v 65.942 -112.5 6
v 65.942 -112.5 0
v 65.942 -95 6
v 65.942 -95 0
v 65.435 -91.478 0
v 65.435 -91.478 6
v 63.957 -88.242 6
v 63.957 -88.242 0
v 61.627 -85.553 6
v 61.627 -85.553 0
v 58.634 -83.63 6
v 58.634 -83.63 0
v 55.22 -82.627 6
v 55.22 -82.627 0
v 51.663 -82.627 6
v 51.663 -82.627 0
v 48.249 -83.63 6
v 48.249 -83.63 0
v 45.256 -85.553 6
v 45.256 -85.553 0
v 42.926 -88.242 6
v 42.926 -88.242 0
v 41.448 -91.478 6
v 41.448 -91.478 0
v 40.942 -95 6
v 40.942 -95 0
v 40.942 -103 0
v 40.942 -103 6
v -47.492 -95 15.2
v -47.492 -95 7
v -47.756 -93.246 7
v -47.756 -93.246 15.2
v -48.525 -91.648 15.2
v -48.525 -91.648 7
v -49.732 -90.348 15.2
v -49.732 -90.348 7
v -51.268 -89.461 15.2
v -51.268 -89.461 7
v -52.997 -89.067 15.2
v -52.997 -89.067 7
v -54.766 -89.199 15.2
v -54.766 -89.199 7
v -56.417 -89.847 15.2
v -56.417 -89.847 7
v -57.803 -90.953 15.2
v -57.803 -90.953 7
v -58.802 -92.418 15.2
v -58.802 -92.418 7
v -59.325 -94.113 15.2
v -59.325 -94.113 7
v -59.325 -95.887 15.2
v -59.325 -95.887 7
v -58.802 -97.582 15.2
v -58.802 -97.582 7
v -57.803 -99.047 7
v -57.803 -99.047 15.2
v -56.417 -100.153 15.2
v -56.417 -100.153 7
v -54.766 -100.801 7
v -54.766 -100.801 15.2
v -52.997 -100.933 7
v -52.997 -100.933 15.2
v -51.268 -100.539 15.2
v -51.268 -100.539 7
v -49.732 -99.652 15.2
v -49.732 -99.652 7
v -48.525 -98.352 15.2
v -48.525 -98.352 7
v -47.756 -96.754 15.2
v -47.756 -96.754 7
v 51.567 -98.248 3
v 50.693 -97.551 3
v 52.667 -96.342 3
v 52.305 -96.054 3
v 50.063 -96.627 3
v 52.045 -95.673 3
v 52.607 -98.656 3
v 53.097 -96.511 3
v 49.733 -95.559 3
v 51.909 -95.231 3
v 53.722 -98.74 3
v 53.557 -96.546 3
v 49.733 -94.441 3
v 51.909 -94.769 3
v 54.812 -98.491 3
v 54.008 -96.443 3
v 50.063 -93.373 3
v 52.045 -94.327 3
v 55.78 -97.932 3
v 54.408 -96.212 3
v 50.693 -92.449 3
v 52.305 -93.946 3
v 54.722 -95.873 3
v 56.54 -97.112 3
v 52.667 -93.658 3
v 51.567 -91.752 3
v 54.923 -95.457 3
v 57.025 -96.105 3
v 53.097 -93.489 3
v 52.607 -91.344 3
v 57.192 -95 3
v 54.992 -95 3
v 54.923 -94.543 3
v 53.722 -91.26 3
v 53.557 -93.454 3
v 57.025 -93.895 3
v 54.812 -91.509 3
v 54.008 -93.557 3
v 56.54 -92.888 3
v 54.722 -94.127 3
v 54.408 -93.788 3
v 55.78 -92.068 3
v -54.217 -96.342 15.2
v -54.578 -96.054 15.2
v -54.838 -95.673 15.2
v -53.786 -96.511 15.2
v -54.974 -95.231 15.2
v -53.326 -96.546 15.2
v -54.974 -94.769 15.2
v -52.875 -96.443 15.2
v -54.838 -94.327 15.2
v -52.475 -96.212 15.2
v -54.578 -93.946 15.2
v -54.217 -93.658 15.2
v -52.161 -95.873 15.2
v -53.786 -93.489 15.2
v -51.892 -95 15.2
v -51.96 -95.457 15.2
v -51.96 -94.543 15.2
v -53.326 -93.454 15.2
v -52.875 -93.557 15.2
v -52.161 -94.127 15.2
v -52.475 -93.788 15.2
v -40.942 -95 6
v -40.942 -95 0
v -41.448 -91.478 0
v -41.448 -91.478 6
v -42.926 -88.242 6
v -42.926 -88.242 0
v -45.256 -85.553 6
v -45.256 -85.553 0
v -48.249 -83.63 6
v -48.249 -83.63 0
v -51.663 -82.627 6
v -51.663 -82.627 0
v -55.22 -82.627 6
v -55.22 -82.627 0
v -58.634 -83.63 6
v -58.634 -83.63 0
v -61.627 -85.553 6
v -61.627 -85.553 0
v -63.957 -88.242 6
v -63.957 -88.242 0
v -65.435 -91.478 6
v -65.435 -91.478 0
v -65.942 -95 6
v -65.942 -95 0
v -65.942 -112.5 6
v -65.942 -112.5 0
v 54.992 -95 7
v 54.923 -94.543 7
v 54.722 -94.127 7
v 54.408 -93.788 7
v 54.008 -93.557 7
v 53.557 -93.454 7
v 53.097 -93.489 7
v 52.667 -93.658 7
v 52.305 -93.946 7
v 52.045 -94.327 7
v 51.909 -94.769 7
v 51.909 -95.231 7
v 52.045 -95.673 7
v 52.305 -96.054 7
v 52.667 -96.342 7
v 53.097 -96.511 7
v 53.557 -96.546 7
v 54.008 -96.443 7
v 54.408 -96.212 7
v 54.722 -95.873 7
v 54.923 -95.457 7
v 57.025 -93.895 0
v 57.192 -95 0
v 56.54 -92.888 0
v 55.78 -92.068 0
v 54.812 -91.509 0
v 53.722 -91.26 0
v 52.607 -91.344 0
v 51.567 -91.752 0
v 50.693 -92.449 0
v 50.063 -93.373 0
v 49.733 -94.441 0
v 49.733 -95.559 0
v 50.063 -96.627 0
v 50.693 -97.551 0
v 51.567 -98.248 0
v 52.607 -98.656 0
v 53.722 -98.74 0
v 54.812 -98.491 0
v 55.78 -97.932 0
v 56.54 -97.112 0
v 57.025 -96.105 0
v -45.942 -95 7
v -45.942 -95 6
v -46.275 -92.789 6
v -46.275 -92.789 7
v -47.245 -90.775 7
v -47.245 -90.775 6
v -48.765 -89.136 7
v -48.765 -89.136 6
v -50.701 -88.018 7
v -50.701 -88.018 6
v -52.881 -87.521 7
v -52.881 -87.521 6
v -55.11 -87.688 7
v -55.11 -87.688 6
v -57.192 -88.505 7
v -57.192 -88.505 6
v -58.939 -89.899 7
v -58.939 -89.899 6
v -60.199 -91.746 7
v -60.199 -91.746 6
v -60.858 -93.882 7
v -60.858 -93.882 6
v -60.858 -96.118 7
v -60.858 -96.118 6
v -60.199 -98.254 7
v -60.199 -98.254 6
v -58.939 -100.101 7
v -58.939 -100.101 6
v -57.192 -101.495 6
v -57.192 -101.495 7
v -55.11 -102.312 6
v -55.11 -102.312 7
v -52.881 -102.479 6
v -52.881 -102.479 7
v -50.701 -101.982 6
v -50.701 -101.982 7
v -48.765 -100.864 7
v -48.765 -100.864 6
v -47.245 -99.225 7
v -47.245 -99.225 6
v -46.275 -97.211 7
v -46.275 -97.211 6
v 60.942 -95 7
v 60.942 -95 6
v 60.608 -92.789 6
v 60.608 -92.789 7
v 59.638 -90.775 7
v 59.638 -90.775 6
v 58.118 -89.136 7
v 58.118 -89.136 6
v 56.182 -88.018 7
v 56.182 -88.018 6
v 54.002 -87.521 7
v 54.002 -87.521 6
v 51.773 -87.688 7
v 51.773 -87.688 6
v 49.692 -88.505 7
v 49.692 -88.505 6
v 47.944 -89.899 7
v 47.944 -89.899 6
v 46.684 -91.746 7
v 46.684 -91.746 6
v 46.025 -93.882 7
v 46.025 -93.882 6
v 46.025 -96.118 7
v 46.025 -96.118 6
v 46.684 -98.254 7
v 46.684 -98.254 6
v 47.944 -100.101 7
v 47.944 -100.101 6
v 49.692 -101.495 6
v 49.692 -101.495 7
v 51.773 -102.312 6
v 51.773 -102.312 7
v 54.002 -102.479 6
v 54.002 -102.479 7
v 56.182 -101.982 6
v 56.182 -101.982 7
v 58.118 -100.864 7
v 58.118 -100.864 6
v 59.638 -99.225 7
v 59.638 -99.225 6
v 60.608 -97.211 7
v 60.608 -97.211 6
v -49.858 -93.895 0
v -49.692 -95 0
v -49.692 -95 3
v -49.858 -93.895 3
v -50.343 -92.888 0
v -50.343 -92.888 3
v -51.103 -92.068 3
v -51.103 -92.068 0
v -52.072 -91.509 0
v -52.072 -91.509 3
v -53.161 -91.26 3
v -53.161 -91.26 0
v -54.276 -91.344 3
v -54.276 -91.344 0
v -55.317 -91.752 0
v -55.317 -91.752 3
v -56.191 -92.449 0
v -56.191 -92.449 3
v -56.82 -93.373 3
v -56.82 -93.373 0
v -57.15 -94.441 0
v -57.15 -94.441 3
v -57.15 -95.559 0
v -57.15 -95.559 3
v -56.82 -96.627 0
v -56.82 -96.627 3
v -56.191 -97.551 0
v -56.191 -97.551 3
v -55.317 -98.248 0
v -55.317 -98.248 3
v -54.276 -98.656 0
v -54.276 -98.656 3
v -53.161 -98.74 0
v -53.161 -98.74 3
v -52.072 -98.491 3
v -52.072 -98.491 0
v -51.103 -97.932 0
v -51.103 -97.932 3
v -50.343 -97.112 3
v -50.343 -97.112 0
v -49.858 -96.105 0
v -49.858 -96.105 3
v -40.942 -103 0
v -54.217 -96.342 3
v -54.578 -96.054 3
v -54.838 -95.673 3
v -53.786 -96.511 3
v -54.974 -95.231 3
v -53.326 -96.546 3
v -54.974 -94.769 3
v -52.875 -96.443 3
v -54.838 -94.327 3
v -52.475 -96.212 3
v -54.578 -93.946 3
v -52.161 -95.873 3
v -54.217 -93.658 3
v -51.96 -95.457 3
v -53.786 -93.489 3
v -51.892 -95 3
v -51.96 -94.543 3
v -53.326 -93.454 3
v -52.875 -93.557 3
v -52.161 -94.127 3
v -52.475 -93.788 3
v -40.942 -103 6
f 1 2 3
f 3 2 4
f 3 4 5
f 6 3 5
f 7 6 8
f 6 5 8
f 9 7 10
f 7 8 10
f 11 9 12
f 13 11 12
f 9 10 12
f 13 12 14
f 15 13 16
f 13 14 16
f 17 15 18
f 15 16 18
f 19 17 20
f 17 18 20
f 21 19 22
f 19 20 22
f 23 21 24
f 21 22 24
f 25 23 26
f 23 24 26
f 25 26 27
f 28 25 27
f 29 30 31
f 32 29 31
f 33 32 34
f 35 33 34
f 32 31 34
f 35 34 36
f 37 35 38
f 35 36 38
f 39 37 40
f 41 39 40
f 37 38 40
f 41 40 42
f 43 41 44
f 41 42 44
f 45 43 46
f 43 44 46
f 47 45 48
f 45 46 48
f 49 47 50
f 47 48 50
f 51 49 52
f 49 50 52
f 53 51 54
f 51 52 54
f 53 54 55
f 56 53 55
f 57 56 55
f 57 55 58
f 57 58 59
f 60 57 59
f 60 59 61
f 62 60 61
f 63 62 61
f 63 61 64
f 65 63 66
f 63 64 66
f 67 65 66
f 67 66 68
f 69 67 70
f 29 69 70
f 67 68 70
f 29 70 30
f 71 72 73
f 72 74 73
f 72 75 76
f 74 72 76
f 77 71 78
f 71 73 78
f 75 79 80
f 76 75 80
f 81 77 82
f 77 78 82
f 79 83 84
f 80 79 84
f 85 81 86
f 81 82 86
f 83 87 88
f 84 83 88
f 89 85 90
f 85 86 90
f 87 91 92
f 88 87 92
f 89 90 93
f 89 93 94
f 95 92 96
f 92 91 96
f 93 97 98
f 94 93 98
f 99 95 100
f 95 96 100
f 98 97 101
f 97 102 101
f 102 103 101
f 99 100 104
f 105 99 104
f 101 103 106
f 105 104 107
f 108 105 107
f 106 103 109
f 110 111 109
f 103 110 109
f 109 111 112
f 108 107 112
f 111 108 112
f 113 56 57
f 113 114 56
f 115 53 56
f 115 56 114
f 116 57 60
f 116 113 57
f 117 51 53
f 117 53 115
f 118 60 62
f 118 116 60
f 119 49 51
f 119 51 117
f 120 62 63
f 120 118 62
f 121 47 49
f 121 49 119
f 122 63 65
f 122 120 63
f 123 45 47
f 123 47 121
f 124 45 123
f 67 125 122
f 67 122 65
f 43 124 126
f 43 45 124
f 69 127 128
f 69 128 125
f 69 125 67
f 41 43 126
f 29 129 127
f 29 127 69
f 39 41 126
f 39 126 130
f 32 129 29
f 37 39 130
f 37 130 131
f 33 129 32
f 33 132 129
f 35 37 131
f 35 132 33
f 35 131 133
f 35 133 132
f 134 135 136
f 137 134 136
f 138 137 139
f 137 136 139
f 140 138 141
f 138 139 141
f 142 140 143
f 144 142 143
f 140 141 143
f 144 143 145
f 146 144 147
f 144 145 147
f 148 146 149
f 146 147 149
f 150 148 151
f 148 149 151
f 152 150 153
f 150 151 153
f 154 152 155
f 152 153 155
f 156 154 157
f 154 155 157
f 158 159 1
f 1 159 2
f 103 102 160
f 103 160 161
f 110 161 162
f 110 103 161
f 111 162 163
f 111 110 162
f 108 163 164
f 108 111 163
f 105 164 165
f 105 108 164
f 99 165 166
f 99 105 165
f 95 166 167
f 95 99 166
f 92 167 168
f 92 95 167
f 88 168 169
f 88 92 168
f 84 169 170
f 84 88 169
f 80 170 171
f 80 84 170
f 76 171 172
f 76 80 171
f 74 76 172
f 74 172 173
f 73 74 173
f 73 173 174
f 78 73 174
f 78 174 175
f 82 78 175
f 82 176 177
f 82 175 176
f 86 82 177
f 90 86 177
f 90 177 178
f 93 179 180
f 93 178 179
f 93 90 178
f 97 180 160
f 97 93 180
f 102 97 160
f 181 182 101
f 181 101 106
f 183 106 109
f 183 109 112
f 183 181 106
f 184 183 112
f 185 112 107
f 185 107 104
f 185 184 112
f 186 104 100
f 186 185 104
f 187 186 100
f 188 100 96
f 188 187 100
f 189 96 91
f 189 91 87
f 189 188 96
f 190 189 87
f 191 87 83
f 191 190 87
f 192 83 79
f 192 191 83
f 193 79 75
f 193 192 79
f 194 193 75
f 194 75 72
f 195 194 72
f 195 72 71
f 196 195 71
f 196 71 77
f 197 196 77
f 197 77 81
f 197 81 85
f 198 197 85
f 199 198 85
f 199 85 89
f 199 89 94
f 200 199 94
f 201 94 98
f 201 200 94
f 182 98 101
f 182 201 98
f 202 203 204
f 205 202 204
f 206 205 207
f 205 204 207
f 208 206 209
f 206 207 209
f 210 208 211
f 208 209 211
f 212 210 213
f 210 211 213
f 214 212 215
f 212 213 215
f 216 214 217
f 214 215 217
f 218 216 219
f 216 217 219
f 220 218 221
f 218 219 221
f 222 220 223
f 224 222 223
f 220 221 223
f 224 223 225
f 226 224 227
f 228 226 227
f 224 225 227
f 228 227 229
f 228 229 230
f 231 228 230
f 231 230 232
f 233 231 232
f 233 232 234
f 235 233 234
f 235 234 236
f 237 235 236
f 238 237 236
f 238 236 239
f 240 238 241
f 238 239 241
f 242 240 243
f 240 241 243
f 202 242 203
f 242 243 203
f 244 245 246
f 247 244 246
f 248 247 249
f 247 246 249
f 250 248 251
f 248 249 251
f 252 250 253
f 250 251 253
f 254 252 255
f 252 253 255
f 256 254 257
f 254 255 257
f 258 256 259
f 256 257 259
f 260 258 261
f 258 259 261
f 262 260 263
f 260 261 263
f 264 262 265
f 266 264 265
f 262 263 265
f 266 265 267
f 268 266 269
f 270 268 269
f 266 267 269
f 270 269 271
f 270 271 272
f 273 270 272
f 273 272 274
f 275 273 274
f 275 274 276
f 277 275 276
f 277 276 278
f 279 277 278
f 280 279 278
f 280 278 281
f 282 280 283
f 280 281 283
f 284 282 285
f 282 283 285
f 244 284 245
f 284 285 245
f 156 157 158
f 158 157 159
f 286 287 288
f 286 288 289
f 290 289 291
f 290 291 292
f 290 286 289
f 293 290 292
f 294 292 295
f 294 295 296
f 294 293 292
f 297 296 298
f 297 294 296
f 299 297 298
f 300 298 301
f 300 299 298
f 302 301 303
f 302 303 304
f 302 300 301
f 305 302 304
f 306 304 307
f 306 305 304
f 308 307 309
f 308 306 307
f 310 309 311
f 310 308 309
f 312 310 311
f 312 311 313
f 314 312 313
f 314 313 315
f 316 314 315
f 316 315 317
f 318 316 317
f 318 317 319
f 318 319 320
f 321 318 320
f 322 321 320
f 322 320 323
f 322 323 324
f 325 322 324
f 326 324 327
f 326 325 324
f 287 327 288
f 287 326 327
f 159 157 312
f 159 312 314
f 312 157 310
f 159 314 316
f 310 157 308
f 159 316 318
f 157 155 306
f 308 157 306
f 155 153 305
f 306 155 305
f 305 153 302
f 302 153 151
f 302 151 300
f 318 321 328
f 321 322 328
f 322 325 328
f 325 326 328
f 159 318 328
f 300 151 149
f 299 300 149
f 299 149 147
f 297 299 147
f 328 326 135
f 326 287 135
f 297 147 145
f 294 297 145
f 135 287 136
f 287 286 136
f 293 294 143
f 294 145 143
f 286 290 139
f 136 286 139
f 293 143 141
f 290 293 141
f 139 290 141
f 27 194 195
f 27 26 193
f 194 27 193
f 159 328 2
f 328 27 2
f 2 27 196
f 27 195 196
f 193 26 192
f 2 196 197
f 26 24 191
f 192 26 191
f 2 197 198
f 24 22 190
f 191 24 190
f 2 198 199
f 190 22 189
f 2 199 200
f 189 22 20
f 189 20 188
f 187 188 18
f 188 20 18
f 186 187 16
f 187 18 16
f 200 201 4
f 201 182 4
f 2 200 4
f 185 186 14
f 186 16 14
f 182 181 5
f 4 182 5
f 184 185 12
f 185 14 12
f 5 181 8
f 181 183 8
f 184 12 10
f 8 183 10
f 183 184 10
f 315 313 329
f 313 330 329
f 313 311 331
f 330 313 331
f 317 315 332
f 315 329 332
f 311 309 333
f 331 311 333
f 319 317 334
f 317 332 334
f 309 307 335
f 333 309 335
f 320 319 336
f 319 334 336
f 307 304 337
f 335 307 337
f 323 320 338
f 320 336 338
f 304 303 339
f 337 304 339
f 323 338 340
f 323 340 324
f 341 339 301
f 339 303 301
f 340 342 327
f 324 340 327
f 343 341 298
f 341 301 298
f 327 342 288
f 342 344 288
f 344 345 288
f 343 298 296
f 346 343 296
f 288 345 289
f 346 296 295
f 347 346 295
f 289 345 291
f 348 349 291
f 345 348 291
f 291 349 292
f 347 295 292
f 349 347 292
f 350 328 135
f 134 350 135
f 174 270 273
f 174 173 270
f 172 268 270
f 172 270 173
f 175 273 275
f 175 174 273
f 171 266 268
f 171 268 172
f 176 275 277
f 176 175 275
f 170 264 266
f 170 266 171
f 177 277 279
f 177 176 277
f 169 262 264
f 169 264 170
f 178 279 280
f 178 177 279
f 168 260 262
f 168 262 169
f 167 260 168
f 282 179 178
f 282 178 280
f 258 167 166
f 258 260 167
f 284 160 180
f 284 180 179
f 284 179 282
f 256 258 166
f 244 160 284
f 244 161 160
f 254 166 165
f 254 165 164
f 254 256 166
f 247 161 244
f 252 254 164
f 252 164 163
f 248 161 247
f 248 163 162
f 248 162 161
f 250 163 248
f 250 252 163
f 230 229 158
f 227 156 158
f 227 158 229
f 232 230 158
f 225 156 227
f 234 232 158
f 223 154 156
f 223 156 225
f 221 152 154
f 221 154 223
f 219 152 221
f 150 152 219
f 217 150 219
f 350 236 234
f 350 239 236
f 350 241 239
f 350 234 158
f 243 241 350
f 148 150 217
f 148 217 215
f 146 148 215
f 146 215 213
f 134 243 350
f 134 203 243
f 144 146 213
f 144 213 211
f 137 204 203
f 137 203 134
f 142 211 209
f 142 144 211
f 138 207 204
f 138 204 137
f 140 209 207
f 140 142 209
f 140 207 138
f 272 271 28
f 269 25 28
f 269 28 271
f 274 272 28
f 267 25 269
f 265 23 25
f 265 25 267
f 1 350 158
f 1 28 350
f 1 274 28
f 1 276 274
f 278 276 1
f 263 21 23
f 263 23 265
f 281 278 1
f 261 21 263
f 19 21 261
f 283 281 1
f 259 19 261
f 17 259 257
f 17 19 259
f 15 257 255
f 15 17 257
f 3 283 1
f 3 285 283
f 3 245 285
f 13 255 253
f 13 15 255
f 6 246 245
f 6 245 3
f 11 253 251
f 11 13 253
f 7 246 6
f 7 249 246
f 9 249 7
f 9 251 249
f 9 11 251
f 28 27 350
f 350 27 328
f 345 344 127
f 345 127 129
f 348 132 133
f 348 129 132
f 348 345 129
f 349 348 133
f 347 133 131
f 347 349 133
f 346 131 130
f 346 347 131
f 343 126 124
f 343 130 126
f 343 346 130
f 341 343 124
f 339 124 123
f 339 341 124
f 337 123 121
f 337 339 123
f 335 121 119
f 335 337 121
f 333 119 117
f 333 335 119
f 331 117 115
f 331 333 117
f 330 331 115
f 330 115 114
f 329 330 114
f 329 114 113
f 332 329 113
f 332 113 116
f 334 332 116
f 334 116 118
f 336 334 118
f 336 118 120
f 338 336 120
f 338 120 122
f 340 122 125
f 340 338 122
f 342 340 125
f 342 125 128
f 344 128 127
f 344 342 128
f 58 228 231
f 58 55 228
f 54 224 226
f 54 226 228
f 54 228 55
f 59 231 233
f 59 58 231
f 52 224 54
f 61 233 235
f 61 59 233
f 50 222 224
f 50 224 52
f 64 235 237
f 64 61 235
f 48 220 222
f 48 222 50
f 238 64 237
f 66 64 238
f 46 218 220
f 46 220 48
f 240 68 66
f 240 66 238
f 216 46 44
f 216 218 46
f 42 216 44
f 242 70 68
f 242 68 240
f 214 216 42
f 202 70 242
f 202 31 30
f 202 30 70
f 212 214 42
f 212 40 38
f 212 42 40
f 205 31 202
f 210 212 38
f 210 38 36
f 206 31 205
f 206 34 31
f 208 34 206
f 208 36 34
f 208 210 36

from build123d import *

# Parameters (mm, degrees)
F2_DEPTH  = 6
F3_R      = 7.5
F4_DEPTH  = 1
F5_R      = 5.95
F6_DEPTH  = 8.2
F7_R      = 1.55
F8_DEPTH  = 15.201
F9_R      = 3.75
F10_DEPTH = 3


with BuildPart() as f2:
    # F1 (on Top) → F2 (new body)
    with BuildSketch(Plane.XY):
        with BuildLine():
            Line((-40.941557, -103), (-40.941557, -95))
            ThreePointArc((-40.941557, -95), (-53.441557, -82.5), (-65.941557, -95))
            Line((-65.941557, -95), (-65.941557, -112.5))
            Line((-65.941557, -112.5), (0, -112.5))
            Line((0, -112.5), (65.941557, -112.5))
            Line((65.941557, -112.5), (65.941557, -95))
            ThreePointArc((65.941557, -95), (53.441557, -82.5), (40.941557, -95))
            Line((40.941557, -95), (40.941557, -103))
            Line((40.941557, -103), (0, -103))
            Line((0, -103), (-40.941557, -103))
        make_face()
    extrude(amount=F2_DEPTH)

    # F3 (on face) → F4 (join)
    with BuildSketch(Plane.XY.offset(6)):
        with Locations((-53.441557, -95)):
            Circle(F3_R)
        with Locations((53.441557, -95)):
            Circle(F3_R)
    extrude(amount=F4_DEPTH)

    # F5 (on face) → F6 (join)
    with BuildSketch(Plane.XY.offset(7)):
        with Locations((-53.441557, -95)):
            Circle(F5_R)
    extrude(amount=F6_DEPTH)

    # F7 (on face) → F8 (cut, through all)
    with BuildSketch(Plane.XY):
        with Locations((-53.441557, -95)):
            Circle(F7_R)
        with Locations((53.441557, -95)):
            Circle(F7_R)
    extrude(amount=F8_DEPTH, mode=Mode.SUBTRACT)

    # F9 (on face) → F10 (cut)
    with BuildSketch(Plane.XY):
        with Locations((-53.441557, -95)):
            Circle(F9_R)
        with Locations((53.441557, -95)):
            Circle(F9_R)
    extrude(amount=F10_DEPTH, mode=Mode.SUBTRACT)


solid = f2.part
